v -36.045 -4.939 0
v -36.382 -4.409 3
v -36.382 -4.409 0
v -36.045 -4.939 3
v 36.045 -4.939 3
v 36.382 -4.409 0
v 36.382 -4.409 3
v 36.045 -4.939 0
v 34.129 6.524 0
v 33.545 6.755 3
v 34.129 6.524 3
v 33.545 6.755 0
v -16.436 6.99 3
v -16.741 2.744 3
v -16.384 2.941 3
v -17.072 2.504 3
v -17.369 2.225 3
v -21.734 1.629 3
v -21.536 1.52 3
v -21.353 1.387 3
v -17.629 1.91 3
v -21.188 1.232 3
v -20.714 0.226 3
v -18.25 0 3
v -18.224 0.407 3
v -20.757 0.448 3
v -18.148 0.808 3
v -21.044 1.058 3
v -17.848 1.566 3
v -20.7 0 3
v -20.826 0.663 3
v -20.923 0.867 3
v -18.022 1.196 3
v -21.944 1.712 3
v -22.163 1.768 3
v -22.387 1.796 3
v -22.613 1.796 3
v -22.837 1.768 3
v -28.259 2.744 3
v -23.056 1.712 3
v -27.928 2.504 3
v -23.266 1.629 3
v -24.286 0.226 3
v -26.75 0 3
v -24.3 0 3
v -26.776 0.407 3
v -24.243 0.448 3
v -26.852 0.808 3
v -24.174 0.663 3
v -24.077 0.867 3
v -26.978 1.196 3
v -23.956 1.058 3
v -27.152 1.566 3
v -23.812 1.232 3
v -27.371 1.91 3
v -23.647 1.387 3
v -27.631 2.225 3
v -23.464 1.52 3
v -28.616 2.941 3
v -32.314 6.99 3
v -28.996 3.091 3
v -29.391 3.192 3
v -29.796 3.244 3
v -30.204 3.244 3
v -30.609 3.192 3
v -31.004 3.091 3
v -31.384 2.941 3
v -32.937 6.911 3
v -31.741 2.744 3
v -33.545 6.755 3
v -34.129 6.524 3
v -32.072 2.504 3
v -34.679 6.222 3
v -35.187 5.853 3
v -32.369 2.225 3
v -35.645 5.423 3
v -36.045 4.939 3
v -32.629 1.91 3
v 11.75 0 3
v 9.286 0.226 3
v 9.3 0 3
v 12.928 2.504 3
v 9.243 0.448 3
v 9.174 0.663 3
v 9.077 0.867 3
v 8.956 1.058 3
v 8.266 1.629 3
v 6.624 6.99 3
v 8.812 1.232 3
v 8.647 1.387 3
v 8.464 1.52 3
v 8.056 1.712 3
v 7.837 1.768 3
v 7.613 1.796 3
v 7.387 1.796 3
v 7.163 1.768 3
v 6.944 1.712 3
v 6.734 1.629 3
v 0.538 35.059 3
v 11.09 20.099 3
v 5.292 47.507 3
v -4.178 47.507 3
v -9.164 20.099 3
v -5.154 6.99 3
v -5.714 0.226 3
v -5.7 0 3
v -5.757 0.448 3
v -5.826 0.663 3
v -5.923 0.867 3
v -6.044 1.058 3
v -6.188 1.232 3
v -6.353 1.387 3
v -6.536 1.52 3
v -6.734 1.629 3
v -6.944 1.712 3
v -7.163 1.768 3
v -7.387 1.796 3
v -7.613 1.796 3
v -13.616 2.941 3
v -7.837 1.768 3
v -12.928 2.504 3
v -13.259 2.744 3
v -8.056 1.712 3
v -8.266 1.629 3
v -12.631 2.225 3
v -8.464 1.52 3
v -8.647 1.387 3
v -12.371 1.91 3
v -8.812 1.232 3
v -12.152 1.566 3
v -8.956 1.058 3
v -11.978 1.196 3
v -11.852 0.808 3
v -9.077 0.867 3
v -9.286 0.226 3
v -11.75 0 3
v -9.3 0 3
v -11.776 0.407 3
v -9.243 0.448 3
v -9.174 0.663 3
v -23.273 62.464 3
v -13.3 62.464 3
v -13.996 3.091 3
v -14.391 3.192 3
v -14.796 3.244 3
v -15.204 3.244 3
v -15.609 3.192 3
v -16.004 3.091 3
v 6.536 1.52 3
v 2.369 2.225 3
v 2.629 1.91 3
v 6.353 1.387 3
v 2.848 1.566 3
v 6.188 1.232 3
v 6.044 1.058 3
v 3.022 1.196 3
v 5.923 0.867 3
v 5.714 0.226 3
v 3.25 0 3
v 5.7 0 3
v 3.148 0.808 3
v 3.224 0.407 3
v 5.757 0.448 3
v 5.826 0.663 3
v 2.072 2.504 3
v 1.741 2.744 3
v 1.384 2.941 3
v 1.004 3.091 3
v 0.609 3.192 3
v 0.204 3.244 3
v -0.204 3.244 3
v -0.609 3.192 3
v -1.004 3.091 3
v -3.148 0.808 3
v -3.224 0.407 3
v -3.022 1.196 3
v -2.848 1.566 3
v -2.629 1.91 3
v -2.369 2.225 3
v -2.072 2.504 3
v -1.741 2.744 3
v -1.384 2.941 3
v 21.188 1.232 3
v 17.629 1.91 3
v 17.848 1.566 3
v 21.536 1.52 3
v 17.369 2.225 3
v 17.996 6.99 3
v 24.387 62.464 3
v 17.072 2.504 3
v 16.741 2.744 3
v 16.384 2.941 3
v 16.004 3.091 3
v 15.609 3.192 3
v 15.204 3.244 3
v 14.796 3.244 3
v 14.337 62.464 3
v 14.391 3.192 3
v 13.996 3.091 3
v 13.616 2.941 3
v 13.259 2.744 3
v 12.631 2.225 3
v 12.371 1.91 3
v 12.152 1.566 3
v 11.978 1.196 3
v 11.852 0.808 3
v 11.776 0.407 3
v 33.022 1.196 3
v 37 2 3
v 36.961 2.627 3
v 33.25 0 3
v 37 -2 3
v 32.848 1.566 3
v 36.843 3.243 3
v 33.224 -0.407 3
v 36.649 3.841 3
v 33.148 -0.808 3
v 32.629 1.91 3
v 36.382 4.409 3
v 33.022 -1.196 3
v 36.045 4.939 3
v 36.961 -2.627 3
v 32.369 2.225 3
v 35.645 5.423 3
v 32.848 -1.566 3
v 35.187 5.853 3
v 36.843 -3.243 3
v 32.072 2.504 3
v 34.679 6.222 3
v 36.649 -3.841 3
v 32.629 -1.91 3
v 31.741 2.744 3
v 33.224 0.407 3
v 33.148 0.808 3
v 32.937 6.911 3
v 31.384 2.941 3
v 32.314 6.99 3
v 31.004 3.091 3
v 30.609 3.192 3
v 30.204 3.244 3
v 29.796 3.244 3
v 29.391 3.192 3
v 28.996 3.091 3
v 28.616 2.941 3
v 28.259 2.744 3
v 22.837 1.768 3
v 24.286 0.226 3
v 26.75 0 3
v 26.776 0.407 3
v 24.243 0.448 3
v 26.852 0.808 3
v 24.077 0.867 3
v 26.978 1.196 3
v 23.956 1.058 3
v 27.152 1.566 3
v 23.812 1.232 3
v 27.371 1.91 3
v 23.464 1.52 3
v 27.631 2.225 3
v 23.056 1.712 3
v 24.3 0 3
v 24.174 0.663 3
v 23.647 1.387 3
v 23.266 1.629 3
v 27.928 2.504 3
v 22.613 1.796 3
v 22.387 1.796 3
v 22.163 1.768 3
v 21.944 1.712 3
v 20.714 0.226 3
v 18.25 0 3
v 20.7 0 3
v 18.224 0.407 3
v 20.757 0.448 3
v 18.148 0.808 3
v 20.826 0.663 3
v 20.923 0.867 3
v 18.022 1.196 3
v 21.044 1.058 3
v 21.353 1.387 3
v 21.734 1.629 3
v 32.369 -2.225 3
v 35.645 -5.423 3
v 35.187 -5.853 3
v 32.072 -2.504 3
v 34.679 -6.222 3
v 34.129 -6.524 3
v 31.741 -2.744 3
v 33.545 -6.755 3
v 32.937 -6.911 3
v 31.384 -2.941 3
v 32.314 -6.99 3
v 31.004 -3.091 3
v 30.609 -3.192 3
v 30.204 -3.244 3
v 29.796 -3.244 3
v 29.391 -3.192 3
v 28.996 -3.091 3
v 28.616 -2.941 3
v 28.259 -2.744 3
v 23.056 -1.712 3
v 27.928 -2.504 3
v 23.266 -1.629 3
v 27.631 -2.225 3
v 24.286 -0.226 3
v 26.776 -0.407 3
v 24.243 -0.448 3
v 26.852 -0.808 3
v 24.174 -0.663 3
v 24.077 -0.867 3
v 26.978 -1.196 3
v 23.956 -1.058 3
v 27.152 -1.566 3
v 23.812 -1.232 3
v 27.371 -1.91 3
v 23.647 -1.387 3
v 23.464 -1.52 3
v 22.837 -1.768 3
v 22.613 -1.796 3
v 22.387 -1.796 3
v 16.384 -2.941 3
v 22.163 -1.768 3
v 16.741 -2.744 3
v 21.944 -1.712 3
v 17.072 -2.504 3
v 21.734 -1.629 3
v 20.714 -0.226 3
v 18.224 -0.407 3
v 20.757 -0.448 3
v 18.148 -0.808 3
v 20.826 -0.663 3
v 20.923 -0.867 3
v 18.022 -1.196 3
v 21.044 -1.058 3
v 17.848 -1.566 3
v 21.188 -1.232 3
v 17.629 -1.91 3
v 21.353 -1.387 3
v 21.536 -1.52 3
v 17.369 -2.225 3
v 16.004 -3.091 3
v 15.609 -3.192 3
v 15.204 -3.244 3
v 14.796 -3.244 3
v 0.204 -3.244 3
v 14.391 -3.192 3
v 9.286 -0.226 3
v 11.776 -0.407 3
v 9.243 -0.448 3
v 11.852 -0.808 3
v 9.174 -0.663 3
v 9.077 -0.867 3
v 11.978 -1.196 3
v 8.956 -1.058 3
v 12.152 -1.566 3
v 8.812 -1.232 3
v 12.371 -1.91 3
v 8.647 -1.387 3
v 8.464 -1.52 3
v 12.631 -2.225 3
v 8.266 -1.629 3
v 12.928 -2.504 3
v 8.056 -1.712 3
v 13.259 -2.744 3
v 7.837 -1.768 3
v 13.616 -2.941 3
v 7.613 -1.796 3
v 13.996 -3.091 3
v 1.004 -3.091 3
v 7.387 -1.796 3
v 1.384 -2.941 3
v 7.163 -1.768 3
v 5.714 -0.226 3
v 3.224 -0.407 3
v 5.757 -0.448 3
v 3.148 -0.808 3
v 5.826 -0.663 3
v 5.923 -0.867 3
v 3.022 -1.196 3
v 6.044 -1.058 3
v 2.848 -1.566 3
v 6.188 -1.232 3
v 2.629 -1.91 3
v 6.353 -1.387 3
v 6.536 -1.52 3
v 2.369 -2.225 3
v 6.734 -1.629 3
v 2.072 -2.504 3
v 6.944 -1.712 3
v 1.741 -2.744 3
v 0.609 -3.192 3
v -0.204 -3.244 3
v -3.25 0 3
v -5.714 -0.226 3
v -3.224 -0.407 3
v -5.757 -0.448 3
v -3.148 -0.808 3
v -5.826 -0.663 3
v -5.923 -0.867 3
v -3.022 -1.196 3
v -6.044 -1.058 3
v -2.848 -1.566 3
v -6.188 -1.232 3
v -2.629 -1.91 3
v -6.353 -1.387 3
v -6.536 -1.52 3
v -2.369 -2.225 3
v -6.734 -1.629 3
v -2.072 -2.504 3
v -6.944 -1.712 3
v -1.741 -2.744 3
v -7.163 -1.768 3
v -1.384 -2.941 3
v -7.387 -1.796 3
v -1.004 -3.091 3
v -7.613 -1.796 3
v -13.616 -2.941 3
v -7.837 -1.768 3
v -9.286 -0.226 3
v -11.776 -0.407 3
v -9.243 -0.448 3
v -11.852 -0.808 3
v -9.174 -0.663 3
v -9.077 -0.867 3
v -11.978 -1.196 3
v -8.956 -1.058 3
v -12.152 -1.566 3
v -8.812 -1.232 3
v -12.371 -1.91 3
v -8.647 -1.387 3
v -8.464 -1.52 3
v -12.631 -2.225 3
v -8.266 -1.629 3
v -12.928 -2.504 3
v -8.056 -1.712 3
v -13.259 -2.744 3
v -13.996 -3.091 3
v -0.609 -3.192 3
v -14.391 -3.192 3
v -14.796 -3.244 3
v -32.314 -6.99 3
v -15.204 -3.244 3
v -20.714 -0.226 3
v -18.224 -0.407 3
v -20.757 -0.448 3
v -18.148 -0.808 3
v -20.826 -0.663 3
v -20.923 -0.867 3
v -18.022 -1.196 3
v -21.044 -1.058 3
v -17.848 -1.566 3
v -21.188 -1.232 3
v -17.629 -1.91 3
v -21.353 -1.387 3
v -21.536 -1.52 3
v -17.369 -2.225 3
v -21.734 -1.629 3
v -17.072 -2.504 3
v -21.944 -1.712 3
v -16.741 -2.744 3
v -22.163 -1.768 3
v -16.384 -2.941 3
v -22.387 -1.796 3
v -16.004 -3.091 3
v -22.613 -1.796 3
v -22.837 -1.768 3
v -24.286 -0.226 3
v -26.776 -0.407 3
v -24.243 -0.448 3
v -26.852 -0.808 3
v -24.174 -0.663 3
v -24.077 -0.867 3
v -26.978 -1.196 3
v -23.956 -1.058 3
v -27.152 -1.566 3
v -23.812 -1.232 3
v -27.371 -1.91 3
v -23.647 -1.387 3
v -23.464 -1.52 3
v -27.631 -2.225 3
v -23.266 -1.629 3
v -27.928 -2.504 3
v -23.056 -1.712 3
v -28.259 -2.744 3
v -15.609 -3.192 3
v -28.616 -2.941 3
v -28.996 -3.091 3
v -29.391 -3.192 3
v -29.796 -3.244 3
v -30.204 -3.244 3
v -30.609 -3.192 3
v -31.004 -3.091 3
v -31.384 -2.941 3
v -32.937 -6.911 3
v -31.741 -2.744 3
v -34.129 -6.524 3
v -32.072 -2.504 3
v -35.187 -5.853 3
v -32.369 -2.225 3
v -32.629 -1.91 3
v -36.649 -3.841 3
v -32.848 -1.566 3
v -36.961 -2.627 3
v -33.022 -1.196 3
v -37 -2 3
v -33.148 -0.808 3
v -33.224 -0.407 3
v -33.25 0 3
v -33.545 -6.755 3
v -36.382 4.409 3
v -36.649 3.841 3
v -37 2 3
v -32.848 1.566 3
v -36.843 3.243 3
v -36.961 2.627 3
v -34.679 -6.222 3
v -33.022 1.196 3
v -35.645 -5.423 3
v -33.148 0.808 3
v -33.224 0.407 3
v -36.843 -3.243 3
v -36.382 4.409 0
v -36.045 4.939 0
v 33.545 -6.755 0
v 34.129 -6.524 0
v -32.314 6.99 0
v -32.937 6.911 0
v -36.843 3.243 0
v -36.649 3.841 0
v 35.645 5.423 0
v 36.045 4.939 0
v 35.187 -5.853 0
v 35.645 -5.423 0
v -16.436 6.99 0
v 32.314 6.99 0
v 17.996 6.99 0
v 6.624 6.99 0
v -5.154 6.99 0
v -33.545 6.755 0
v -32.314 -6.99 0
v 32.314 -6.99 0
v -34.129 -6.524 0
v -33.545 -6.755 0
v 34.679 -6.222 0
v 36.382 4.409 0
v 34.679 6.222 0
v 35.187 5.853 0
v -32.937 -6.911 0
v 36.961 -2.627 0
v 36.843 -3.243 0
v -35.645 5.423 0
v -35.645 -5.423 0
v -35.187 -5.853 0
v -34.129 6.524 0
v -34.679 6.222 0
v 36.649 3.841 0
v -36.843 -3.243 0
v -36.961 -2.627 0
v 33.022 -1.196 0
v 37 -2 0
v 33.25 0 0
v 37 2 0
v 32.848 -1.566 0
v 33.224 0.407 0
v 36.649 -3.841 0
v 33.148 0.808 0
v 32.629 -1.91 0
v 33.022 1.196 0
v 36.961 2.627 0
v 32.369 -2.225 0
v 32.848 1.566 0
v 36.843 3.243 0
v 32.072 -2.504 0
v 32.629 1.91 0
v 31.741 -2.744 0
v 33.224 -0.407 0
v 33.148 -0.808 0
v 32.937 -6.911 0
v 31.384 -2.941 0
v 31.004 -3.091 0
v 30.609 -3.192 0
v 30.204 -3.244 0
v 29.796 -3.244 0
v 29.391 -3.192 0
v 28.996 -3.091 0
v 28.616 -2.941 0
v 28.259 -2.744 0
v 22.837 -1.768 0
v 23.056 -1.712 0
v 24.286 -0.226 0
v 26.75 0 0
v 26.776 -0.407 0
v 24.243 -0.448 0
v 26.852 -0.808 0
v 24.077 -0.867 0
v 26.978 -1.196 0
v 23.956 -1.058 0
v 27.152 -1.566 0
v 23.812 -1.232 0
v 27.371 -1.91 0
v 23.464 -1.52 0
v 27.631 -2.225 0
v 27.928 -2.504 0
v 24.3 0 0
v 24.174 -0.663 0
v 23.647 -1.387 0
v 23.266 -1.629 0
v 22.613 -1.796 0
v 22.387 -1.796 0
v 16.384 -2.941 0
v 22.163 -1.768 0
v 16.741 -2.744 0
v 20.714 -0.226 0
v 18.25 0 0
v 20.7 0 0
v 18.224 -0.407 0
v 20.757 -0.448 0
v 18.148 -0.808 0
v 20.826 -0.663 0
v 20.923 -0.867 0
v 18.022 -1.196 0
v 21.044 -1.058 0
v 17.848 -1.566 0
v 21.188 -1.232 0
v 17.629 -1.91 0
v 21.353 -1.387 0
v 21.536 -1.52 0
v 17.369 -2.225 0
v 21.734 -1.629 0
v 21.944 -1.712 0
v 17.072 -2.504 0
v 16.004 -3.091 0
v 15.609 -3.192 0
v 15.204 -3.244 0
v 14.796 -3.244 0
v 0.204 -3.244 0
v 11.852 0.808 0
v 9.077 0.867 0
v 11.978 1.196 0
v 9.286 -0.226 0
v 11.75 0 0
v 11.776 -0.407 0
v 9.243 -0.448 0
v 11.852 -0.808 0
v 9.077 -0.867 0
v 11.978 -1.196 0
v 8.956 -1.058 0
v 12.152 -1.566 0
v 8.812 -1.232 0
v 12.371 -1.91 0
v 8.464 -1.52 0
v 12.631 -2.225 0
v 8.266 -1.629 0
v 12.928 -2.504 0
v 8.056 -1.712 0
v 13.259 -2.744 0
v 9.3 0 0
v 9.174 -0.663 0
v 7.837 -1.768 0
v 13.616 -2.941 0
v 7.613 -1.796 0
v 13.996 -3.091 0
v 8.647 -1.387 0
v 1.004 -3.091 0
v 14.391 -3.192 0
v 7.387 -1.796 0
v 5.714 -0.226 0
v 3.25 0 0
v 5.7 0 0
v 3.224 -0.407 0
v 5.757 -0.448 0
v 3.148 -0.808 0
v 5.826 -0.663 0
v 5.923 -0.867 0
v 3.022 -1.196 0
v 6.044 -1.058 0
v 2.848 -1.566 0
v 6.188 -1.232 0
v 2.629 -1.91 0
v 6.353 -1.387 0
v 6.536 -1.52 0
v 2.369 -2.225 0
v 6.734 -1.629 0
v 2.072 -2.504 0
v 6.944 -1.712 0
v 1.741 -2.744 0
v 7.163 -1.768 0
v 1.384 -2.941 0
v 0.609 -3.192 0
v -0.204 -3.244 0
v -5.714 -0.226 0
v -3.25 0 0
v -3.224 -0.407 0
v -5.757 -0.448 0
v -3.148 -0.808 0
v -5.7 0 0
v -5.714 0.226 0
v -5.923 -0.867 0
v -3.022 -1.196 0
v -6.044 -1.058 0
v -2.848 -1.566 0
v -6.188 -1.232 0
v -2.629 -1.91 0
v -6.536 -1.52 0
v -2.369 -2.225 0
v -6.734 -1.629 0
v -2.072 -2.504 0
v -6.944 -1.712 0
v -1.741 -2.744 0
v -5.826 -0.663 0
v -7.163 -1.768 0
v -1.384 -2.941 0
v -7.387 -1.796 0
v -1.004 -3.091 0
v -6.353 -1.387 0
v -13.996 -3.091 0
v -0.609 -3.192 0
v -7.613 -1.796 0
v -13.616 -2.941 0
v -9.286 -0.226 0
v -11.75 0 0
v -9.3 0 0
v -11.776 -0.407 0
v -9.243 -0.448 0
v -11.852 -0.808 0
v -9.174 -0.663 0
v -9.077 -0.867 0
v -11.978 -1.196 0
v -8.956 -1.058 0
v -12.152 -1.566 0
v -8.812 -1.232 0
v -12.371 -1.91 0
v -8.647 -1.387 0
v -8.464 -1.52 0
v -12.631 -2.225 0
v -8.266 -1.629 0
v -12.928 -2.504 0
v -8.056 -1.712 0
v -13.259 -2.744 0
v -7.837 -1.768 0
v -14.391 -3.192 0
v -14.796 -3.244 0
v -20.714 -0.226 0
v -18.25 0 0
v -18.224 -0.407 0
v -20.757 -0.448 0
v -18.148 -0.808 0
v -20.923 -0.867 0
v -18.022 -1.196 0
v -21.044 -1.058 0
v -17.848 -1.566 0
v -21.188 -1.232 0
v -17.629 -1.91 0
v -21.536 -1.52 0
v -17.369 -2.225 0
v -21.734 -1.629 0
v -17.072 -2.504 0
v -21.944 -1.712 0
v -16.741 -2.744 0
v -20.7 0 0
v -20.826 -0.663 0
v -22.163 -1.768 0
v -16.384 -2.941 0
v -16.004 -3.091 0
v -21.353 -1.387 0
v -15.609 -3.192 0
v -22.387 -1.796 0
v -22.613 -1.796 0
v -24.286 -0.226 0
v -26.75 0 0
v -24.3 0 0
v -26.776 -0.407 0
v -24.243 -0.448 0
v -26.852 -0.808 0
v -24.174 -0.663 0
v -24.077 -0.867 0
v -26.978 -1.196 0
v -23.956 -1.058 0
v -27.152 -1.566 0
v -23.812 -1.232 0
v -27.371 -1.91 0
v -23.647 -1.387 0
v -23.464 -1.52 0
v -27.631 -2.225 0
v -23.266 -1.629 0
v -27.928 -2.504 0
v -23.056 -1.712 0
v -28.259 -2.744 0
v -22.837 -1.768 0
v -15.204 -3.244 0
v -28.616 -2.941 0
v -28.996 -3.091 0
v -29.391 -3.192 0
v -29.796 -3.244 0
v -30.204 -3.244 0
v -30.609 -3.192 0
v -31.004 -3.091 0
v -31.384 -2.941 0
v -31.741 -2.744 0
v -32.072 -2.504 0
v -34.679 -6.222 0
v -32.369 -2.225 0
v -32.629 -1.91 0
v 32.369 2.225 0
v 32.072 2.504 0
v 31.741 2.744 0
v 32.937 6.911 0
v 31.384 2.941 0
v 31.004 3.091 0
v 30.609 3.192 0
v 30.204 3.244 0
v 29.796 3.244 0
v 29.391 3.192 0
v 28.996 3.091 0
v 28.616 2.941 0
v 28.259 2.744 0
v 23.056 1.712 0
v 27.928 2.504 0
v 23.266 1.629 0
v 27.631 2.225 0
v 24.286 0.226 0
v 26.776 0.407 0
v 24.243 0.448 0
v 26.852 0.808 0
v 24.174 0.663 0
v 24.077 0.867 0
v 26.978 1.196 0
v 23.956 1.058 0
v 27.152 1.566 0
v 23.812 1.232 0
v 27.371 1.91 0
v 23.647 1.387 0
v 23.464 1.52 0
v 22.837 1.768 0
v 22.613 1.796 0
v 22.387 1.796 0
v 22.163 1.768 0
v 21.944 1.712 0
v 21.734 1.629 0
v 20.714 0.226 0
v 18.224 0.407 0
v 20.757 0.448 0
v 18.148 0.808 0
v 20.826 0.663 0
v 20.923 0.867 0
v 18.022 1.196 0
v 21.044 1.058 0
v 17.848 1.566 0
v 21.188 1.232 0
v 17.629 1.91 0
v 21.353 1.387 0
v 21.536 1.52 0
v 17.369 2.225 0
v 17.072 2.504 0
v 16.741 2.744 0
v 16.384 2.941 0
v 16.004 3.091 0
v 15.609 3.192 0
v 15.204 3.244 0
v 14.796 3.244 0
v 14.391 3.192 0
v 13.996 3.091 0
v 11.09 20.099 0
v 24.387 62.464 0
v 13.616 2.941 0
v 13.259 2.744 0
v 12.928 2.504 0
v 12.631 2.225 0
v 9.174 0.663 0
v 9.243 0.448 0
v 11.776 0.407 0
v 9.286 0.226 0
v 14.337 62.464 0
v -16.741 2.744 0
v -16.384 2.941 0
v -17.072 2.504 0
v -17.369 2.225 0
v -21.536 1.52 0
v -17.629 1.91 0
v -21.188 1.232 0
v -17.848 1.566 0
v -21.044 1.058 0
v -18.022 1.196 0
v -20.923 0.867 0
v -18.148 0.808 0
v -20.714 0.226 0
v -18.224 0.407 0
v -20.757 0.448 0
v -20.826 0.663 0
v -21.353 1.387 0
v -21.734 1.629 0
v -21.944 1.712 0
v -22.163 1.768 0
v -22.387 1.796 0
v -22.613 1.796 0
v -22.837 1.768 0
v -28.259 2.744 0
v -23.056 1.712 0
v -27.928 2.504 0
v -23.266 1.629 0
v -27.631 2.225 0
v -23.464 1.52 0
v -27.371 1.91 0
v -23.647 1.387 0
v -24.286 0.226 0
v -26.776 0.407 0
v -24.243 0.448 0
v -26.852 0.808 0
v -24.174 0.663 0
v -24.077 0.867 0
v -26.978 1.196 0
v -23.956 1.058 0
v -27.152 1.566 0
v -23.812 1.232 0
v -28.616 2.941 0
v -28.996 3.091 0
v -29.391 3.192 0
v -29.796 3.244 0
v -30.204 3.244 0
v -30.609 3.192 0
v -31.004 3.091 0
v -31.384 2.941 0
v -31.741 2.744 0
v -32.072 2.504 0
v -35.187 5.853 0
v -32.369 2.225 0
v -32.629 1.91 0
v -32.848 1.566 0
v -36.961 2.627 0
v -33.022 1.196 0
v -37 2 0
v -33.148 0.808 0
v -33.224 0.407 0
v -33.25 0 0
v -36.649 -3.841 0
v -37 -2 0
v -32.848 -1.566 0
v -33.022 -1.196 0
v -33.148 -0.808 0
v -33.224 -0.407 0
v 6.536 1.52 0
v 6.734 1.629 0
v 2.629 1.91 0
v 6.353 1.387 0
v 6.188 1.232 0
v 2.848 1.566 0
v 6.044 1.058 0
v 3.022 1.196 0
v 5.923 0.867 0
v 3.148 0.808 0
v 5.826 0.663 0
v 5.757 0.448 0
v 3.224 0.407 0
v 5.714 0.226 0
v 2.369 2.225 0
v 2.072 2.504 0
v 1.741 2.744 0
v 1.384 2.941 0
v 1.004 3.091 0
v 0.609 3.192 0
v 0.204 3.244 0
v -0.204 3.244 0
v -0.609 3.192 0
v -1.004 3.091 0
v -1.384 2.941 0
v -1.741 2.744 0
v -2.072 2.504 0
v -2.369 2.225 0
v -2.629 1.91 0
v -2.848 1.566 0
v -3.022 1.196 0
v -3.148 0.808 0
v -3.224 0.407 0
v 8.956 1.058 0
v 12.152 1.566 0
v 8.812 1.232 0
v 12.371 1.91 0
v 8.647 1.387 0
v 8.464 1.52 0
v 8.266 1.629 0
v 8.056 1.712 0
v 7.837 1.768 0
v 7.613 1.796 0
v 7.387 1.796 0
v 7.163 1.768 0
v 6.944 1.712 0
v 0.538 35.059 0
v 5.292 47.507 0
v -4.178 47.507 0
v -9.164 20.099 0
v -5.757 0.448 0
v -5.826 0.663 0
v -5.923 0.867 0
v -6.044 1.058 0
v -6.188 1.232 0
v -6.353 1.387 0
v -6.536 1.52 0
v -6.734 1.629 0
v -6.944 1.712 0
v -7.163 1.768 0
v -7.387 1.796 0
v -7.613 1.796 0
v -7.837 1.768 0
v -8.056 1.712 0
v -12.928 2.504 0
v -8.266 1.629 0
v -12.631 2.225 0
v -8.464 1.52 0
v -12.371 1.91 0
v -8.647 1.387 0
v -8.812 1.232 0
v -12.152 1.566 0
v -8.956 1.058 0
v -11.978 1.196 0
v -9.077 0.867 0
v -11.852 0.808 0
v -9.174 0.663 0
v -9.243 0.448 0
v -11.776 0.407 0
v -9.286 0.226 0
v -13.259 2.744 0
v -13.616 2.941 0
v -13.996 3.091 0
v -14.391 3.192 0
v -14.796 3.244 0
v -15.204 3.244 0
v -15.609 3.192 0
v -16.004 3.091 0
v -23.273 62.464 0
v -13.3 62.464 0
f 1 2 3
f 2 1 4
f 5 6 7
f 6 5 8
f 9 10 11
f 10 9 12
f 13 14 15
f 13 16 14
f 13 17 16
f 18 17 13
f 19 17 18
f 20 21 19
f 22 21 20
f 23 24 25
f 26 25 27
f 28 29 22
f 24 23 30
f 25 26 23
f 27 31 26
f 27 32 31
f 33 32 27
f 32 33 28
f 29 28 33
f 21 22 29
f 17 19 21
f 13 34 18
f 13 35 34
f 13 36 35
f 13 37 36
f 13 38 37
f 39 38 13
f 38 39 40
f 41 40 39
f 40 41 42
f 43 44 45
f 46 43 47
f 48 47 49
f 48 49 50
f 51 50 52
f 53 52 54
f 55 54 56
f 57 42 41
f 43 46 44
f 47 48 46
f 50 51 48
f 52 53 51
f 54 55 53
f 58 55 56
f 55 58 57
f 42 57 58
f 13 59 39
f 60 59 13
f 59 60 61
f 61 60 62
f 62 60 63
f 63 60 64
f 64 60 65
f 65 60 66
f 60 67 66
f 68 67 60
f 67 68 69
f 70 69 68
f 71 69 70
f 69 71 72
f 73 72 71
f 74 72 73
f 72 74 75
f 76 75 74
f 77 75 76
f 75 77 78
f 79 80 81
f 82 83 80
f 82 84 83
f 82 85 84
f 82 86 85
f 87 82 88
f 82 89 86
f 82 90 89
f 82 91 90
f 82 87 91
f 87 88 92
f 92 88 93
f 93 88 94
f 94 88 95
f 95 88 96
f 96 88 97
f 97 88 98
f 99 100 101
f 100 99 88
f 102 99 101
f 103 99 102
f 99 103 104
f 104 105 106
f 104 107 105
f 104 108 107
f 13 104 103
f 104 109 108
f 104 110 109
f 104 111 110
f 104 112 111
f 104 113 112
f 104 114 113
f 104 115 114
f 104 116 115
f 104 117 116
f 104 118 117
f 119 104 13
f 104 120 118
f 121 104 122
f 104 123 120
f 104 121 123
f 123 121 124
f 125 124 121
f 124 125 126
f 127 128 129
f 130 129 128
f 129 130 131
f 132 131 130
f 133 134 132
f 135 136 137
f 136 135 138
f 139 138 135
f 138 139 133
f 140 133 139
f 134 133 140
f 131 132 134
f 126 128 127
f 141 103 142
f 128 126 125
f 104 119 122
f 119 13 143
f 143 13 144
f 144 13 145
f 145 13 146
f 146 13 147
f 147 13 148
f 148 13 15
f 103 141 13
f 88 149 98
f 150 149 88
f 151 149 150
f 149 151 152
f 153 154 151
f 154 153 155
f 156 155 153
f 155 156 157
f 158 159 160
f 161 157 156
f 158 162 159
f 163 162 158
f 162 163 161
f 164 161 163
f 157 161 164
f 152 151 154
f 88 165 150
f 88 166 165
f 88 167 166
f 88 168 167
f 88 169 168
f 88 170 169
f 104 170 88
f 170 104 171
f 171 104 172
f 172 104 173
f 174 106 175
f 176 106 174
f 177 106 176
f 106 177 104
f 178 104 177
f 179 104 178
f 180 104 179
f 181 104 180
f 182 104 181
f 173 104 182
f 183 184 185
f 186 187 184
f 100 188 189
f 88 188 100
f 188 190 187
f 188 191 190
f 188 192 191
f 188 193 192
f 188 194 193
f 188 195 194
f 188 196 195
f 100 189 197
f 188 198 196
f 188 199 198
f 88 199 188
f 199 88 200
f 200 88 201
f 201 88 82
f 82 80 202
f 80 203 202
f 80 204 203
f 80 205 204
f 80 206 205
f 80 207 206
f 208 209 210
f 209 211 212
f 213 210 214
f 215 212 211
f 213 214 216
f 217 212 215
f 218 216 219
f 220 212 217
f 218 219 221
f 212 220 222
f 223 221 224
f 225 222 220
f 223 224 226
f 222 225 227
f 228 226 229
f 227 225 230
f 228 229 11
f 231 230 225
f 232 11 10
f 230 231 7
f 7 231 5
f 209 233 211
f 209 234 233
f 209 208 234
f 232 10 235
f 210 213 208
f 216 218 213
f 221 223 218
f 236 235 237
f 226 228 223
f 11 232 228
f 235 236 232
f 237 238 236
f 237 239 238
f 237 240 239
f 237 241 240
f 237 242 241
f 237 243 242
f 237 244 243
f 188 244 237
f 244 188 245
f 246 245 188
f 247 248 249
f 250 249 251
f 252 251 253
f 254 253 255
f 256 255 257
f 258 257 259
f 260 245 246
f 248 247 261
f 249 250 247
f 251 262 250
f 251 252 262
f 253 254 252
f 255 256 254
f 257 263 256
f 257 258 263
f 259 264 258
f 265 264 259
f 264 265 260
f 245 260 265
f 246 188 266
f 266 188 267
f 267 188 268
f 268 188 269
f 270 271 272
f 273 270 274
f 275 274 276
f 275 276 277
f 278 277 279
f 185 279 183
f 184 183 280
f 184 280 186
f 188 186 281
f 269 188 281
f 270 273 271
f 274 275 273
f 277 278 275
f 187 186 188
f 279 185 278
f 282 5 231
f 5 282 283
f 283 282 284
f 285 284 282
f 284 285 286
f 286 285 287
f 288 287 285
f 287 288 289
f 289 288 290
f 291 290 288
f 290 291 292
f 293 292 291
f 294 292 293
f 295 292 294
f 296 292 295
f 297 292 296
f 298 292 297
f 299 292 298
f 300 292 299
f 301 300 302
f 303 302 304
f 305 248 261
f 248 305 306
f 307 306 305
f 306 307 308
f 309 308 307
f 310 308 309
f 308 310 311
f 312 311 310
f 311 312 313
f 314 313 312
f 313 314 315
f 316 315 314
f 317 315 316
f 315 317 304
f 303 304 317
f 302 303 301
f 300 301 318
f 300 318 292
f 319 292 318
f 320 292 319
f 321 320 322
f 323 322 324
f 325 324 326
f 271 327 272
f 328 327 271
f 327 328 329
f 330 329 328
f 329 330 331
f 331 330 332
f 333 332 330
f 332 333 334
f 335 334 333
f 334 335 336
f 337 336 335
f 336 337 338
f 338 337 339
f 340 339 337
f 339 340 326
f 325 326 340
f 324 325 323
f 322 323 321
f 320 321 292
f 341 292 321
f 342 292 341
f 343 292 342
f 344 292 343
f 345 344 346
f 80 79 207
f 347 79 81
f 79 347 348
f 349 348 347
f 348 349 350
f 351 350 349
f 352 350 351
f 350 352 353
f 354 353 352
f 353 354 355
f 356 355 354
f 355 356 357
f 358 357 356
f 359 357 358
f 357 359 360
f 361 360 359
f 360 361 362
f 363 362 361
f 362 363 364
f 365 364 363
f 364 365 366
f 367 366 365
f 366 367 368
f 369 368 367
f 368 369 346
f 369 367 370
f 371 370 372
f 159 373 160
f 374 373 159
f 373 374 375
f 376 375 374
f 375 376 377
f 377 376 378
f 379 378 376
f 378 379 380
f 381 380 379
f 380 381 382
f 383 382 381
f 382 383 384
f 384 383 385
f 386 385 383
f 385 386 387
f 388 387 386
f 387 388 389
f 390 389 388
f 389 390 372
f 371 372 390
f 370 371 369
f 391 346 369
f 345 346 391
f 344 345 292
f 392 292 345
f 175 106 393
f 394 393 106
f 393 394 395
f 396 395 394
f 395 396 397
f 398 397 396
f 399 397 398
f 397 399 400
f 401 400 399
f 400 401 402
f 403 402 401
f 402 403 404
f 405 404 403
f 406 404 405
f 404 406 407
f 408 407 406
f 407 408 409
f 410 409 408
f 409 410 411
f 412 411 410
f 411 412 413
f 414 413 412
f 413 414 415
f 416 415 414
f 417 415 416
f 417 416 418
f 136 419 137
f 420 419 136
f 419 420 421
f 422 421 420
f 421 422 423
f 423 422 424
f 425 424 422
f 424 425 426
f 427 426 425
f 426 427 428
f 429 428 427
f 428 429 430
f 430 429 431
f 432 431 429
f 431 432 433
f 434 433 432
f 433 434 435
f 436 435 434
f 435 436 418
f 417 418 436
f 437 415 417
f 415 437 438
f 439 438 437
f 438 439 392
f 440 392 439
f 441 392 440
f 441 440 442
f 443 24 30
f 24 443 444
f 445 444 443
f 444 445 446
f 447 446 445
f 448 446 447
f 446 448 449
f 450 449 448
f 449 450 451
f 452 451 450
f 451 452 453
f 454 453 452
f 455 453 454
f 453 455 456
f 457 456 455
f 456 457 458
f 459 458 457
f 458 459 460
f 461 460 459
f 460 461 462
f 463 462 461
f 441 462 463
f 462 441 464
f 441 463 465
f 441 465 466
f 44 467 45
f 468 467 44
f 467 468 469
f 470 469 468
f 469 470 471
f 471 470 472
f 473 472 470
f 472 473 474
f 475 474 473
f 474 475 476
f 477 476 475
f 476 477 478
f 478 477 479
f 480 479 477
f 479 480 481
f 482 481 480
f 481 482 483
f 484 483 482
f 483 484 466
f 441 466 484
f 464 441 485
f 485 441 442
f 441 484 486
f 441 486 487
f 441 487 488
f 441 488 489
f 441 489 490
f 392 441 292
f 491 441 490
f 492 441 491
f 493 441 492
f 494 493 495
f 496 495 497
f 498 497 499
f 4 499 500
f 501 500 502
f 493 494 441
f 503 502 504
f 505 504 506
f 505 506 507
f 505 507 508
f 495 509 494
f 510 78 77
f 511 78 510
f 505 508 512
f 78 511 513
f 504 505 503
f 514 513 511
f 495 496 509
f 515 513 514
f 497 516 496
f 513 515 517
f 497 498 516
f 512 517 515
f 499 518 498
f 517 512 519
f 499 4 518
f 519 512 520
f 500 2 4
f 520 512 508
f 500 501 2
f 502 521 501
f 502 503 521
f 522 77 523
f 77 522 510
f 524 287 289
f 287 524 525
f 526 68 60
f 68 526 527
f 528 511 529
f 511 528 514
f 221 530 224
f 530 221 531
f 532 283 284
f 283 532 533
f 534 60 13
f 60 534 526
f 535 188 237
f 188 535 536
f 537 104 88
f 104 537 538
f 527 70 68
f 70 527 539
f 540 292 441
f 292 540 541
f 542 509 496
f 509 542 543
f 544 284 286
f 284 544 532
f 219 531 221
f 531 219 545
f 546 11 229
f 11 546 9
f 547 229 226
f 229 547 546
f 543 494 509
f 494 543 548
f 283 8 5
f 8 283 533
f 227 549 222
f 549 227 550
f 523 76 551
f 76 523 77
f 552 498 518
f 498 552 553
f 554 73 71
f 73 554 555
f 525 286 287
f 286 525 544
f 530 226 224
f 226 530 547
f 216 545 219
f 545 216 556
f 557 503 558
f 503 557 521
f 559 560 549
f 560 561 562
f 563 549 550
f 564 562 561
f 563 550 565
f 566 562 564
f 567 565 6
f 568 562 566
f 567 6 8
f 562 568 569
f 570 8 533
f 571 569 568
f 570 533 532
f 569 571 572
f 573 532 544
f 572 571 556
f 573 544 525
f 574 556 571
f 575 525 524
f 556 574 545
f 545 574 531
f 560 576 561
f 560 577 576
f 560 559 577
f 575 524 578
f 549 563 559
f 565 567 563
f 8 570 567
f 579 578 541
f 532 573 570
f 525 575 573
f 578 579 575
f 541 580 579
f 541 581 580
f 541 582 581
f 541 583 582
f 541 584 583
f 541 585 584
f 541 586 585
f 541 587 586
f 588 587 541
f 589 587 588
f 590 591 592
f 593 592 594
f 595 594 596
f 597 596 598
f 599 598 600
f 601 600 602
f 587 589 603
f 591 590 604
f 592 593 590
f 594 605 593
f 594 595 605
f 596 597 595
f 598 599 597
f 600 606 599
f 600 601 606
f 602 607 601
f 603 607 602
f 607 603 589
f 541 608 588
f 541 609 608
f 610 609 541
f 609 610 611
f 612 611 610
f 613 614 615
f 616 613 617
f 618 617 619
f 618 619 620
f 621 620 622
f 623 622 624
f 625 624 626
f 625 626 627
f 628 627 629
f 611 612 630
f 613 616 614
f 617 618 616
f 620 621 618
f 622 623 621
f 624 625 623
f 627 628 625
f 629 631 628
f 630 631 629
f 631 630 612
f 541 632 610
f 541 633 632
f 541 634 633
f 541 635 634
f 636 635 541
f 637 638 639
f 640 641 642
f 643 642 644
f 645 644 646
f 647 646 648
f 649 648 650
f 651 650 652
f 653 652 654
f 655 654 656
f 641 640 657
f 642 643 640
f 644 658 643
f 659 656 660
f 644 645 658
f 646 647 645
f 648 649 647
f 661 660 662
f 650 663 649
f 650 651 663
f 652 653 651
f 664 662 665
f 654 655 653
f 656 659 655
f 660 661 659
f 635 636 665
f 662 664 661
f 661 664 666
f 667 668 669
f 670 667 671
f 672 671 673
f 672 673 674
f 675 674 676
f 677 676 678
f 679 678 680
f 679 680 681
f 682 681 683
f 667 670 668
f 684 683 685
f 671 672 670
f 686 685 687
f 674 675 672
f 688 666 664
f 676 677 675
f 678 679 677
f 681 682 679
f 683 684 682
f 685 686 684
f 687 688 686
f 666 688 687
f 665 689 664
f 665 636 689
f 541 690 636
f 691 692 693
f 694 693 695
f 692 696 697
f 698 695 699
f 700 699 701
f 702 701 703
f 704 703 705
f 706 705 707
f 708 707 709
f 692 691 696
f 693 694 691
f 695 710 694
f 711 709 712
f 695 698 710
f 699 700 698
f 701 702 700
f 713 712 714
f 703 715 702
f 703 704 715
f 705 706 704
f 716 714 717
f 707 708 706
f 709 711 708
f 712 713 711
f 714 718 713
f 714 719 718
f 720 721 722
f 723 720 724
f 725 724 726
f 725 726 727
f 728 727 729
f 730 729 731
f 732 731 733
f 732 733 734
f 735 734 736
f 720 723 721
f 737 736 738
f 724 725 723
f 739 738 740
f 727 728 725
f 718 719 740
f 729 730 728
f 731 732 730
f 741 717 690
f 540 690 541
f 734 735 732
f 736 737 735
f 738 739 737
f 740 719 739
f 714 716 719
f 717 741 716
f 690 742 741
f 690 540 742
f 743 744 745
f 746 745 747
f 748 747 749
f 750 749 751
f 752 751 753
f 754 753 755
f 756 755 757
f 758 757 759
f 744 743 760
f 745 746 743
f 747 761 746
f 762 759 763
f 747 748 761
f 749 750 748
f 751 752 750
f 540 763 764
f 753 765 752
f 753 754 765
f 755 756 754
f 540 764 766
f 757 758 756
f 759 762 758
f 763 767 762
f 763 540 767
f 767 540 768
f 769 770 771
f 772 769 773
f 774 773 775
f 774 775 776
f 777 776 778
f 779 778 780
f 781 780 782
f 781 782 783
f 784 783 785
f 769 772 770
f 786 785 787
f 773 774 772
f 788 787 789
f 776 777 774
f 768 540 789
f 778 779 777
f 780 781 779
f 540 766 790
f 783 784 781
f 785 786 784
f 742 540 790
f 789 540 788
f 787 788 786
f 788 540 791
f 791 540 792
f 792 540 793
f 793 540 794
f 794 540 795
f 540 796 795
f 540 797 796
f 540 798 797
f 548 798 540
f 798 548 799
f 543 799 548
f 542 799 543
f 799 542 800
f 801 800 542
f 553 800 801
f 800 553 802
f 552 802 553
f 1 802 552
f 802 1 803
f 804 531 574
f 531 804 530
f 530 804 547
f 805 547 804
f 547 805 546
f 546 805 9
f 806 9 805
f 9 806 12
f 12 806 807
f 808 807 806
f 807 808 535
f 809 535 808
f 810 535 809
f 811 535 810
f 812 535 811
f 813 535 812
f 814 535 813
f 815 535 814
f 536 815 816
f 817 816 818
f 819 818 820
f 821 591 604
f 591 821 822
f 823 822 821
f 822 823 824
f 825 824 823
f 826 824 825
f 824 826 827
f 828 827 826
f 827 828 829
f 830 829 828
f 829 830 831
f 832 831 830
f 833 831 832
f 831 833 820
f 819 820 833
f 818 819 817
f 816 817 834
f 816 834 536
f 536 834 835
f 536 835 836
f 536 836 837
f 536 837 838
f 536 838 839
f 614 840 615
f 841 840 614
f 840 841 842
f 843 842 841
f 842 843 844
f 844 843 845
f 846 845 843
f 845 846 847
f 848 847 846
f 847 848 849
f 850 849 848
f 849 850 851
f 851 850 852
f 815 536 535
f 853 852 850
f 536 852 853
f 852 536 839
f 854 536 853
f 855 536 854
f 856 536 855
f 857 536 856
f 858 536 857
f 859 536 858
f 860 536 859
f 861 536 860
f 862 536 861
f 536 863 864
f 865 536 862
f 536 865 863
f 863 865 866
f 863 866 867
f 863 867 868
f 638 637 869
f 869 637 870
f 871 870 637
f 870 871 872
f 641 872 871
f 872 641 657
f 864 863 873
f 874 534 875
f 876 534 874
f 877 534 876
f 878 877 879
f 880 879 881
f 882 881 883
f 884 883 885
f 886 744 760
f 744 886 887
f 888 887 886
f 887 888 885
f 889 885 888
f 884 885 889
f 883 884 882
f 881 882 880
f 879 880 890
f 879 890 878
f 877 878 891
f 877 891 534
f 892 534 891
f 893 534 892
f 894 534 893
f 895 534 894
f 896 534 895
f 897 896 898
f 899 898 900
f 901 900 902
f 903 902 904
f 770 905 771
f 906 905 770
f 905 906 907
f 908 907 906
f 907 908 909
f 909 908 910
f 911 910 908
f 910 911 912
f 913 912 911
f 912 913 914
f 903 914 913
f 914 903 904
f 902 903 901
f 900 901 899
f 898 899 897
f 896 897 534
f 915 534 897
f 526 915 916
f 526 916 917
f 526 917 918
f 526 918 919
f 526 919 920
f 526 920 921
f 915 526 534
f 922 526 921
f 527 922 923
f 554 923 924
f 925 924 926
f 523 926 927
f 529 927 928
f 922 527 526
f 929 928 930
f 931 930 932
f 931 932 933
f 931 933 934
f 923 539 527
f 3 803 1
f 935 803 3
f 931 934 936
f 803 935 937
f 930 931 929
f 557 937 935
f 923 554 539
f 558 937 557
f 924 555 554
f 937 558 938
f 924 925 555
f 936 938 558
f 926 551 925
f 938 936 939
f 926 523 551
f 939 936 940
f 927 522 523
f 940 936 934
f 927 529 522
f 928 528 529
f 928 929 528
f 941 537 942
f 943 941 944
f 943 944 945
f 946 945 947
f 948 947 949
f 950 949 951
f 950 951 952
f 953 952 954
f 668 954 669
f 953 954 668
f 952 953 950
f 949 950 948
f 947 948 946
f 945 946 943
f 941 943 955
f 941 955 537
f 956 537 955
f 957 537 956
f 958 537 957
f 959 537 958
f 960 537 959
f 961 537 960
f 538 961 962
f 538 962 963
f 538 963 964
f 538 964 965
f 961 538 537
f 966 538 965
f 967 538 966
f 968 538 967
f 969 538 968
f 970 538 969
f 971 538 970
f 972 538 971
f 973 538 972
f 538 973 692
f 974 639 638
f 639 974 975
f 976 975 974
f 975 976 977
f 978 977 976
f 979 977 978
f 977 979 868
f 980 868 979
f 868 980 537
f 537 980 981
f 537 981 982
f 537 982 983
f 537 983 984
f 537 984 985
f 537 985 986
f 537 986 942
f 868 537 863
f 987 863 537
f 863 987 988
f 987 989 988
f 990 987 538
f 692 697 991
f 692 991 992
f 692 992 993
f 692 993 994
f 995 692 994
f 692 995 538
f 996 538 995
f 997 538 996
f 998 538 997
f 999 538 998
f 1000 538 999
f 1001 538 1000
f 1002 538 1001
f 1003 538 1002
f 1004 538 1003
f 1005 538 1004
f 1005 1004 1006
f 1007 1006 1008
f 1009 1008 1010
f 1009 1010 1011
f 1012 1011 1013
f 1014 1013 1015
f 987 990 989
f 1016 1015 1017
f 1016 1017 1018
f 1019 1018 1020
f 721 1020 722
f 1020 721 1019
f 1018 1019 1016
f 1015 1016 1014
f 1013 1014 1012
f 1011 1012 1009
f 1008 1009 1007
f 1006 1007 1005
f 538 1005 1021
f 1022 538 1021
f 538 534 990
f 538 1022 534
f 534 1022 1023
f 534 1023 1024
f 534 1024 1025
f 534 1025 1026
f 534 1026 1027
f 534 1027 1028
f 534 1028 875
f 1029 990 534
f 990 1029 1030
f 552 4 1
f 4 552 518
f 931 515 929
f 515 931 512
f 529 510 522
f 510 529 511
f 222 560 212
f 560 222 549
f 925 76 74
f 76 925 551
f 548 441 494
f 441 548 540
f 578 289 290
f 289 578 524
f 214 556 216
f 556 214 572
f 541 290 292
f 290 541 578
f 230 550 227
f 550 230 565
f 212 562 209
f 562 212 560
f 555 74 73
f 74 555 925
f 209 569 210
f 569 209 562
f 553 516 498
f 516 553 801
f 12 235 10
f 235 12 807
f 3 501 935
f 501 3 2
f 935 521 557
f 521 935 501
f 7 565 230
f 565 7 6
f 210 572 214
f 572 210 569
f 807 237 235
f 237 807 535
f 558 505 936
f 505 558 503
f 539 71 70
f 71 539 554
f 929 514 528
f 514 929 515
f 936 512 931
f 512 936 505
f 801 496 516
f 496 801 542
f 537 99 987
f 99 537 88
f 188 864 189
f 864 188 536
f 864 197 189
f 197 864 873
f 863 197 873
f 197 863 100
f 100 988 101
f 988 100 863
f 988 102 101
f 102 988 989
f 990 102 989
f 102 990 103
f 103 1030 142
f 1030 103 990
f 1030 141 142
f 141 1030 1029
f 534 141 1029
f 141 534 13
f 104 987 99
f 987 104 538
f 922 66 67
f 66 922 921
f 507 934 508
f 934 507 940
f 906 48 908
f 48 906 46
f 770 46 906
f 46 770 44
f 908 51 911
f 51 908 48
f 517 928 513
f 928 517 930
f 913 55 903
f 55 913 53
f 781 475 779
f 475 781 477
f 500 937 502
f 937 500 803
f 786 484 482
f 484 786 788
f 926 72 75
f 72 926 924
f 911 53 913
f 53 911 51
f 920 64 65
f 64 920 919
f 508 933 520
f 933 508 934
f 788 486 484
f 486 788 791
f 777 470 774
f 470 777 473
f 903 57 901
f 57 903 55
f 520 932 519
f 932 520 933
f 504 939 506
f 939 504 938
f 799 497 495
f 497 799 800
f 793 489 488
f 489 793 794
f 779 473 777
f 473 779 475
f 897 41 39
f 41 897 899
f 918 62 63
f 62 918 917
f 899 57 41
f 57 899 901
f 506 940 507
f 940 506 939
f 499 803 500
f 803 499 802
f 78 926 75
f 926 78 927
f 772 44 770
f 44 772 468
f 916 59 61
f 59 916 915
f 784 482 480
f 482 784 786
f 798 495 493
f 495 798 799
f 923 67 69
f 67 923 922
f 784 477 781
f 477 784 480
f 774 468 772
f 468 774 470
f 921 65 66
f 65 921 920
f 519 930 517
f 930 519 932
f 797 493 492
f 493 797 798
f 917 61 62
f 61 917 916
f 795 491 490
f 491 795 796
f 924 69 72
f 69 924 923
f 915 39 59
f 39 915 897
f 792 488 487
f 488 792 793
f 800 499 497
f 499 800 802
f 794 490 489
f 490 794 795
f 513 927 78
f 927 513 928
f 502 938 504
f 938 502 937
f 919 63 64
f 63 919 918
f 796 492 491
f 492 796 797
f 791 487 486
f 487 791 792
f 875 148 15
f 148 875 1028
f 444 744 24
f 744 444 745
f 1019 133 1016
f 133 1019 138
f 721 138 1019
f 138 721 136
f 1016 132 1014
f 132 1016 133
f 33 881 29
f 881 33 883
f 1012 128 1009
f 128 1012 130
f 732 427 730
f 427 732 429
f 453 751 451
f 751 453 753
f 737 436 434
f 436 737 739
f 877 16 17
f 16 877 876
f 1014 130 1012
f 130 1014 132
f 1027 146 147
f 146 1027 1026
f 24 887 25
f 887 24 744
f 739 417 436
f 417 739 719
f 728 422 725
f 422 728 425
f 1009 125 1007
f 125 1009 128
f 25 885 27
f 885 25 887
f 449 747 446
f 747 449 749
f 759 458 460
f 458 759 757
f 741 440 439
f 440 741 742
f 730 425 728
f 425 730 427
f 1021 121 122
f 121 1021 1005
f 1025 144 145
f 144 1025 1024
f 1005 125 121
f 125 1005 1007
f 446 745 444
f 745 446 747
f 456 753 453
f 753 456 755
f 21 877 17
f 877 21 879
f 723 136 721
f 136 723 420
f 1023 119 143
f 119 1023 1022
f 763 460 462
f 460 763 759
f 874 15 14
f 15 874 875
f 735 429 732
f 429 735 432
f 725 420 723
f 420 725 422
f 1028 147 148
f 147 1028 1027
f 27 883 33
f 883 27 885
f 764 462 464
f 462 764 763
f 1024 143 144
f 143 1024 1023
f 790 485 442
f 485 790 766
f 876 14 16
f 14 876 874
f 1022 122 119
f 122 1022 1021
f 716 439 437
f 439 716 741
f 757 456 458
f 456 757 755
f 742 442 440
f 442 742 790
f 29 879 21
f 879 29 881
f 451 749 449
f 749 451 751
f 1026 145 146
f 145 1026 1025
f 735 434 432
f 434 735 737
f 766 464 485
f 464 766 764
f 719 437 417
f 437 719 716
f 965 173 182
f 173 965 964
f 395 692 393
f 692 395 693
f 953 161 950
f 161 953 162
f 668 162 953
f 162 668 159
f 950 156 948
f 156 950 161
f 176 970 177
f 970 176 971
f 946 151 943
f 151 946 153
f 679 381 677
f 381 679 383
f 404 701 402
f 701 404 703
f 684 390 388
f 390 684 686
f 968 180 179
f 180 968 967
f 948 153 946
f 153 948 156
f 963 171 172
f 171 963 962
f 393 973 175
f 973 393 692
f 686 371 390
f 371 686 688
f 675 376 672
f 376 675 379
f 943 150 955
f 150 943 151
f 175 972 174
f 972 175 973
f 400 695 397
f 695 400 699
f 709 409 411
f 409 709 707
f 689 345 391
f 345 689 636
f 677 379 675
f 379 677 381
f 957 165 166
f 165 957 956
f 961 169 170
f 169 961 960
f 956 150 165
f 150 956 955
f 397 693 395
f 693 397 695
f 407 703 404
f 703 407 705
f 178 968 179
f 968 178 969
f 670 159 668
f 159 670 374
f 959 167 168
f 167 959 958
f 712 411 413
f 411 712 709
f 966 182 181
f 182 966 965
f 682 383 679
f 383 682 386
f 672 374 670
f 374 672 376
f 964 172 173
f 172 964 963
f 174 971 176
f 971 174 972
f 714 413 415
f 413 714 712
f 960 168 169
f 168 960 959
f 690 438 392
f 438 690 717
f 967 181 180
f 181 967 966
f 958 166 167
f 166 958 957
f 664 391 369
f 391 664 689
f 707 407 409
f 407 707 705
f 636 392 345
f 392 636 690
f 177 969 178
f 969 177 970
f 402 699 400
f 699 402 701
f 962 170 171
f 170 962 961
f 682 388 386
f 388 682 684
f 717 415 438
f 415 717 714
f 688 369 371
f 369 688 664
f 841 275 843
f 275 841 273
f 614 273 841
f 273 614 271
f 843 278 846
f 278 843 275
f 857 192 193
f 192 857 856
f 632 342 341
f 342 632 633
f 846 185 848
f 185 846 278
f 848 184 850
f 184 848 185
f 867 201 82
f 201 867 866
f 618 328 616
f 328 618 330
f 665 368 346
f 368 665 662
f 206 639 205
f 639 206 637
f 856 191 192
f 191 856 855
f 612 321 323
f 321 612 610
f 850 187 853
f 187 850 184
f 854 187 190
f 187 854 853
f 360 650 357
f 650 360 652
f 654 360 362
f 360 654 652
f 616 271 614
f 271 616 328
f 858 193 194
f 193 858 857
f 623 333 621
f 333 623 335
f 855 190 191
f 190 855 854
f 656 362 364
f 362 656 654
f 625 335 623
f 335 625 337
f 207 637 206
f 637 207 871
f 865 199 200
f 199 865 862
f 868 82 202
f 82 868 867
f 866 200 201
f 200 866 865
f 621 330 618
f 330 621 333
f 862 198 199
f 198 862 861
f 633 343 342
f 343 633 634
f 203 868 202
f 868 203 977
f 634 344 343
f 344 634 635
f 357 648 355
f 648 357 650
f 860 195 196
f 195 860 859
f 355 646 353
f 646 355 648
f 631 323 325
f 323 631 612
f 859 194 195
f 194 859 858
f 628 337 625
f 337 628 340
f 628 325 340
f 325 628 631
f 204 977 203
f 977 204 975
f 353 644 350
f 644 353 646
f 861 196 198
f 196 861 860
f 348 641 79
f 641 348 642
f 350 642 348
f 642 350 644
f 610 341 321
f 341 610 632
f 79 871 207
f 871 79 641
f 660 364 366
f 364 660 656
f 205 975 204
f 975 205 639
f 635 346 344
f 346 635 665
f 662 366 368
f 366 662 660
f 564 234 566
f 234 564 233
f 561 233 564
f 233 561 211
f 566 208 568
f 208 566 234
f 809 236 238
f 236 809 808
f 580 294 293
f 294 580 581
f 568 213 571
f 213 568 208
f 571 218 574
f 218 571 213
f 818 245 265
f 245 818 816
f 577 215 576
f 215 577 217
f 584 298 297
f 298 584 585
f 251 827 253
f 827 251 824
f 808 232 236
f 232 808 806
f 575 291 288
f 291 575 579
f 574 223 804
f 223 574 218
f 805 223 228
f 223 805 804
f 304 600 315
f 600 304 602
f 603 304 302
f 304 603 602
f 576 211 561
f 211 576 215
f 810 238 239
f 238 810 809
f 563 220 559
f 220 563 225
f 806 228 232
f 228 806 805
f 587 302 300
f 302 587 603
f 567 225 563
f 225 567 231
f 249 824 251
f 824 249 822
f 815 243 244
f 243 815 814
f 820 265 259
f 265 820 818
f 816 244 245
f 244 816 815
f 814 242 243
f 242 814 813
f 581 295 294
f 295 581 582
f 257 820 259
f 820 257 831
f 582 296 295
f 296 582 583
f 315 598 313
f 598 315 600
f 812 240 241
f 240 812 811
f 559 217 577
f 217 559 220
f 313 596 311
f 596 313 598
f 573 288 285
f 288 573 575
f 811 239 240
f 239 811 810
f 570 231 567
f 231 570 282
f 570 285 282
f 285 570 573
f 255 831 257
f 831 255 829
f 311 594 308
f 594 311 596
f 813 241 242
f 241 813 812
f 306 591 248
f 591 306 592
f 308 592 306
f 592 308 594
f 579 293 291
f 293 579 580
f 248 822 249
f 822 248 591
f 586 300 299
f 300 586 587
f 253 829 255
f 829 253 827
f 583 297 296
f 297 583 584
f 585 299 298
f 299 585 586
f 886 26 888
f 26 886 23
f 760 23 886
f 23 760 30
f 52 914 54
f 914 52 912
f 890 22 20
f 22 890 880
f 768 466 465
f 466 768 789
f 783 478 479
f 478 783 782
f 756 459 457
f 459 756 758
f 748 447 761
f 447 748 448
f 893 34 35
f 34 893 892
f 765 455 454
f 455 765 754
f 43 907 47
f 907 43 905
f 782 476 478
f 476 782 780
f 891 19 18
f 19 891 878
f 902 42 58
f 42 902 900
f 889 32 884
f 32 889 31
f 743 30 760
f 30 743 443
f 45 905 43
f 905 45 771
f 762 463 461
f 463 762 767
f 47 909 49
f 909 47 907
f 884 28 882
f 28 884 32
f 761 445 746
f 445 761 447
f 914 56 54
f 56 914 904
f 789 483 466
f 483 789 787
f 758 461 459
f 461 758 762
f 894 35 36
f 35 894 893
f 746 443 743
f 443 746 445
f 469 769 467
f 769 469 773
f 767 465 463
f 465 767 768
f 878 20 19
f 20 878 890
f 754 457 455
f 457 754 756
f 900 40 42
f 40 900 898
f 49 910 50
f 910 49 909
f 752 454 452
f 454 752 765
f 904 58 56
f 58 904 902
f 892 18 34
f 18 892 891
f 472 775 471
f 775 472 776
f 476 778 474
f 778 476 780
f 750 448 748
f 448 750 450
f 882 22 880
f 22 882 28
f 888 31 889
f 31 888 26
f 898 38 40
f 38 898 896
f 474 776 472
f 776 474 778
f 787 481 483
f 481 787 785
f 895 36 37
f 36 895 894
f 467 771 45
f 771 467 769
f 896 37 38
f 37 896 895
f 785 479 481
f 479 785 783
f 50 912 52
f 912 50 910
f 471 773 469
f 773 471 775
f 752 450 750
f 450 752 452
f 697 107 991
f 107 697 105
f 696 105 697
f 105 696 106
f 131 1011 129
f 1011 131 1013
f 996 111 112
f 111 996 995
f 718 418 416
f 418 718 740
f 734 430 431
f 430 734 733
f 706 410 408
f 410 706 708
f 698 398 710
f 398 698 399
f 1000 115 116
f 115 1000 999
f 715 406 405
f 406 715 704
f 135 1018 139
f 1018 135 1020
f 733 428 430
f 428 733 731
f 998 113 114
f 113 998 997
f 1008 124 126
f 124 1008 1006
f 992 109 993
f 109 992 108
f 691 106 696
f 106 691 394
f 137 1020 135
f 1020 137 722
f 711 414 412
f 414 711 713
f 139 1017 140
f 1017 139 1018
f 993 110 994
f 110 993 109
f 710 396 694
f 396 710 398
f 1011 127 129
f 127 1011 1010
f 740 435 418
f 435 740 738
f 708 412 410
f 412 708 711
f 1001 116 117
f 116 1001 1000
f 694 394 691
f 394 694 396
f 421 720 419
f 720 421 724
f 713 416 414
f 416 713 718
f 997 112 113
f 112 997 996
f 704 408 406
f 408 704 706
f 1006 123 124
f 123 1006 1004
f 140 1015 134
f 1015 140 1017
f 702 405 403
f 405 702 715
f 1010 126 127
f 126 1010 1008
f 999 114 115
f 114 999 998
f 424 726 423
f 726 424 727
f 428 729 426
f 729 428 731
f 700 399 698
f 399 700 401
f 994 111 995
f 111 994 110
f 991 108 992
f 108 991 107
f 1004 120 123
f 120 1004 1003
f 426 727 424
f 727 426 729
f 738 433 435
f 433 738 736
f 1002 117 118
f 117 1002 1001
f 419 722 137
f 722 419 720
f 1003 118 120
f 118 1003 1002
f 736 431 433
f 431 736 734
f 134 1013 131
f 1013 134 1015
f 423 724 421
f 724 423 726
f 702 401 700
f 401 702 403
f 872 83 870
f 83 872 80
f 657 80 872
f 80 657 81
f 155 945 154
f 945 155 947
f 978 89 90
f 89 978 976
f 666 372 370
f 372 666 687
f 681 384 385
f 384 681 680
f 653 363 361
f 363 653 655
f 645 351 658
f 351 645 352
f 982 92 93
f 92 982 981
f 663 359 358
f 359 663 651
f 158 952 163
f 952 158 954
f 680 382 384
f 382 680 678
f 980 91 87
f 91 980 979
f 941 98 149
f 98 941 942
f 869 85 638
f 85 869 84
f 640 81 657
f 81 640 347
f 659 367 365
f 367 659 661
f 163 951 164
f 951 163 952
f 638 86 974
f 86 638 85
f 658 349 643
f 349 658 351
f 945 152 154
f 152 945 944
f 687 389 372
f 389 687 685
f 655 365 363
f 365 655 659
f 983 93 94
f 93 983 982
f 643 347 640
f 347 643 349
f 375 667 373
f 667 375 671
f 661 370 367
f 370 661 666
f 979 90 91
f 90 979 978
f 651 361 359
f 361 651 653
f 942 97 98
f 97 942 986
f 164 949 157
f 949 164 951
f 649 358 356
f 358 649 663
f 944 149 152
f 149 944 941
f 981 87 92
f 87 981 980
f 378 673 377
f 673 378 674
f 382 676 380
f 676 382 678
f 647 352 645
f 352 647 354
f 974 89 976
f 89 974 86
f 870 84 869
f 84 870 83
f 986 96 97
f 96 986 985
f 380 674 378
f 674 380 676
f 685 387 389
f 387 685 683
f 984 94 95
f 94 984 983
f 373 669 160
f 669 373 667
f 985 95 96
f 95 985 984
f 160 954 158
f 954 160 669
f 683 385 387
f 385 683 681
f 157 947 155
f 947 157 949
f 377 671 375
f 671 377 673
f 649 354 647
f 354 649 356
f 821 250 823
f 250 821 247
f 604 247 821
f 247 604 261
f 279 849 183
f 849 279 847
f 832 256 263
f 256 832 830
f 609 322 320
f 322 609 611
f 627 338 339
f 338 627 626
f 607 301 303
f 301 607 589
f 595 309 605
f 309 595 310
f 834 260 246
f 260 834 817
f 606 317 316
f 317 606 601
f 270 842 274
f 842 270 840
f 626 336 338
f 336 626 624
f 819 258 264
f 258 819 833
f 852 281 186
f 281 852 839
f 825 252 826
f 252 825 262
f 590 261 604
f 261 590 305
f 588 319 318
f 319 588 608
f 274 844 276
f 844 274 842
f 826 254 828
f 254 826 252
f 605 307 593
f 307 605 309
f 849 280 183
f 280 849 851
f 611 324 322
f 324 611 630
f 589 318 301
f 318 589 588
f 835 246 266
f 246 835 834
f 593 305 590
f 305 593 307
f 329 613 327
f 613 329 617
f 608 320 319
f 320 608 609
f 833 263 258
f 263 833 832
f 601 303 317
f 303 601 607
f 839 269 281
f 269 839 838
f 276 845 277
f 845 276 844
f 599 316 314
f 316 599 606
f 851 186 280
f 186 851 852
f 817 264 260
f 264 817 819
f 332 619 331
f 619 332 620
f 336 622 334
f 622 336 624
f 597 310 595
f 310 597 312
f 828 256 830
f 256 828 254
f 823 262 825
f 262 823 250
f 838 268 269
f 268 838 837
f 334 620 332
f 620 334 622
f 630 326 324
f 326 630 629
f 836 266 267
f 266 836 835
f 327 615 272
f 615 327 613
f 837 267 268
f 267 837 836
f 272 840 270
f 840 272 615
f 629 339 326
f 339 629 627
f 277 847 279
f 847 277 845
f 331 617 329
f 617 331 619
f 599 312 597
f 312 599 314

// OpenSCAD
$fn = 50;


difference() {
	union() {
		hull() {
			translate(v = [-32.0000000000, 2.0000000000, 0]) {
				cylinder(h = 3, r = 5);
			}
			translate(v = [32.0000000000, 2.0000000000, 0]) {
				cylinder(h = 3, r = 5);
			}
			translate(v = [-32.0000000000, -2.0000000000, 0]) {
				cylinder(h = 3, r = 5);
			}
			translate(v = [32.0000000000, -2.0000000000, 0]) {
				cylinder(h = 3, r = 5);
			}
		}
		translate(v = [0, 61.1111111111, 0]) {
			linear_extrude(height = 3) {
				text(font = "DejaVu Sans Mono:style=Bold", halign = "center", size = 57.0000000000, text = "W", valign = "top");
			}
		}
	}
	union() {
		translate(v = [-30.0000000000, 0.0000000000, 0]) {
			translate(v = [0, 0, -100]) {
				cylinder(h = 200, r = 3.2500000000);
			}
		}
		translate(v = [-15.0000000000, 0.0000000000, 0]) {
			translate(v = [0, 0, -100]) {
				cylinder(h = 200, r = 3.2500000000);
			}
		}
		translate(v = [0, 0, -100]) {
			cylinder(h = 200, r = 3.2500000000);
		}
		translate(v = [15.0000000000, 0.0000000000, 0]) {
			translate(v = [0, 0, -100]) {
				cylinder(h = 200, r = 3.2500000000);
			}
		}
		translate(v = [30.0000000000, 0.0000000000, 0]) {
			translate(v = [0, 0, -100]) {
				cylinder(h = 200, r = 3.2500000000);
			}
		}
		translate(v = [-30.0000000000, 0.0000000000, 0]) {
			translate(v = [0, 0, -100]) {
				cylinder(h = 200, r = 1.8000000000);
			}
		}
		translate(v = [-22.5000000000, 0.0000000000, 0]) {
			translate(v = [0, 0, -100]) {
				cylinder(h = 200, r = 1.8000000000);
			}
		}
		translate(v = [-15.0000000000, 0.0000000000, 0]) {
			translate(v = [0, 0, -100]) {
				cylinder(h = 200, r = 1.8000000000);
			}
		}
		translate(v = [-7.5000000000, 0.0000000000, 0]) {
			translate(v = [0, 0, -100]) {
				cylinder(h = 200, r = 1.8000000000);
			}
		}
		translate(v = [0, 0, -100]) {
			cylinder(h = 200, r = 1.8000000000);
		}
		translate(v = [7.5000000000, 0.0000000000, 0]) {
			translate(v = [0, 0, -100]) {
				cylinder(h = 200, r = 1.8000000000);
			}
		}
		translate(v = [15.0000000000, 0.0000000000, 0]) {
			translate(v = [0, 0, -100]) {
				cylinder(h = 200, r = 1.8000000000);
			}
		}
		translate(v = [22.5000000000, 0.0000000000, 0]) {
			translate(v = [0, 0, -100]) {
				cylinder(h = 200, r = 1.8000000000);
			}
		}
		translate(v = [30.0000000000, 0.0000000000, 0]) {
			translate(v = [0, 0, -100]) {
				cylinder(h = 200, r = 1.8000000000);
			}
		}
	}
}
